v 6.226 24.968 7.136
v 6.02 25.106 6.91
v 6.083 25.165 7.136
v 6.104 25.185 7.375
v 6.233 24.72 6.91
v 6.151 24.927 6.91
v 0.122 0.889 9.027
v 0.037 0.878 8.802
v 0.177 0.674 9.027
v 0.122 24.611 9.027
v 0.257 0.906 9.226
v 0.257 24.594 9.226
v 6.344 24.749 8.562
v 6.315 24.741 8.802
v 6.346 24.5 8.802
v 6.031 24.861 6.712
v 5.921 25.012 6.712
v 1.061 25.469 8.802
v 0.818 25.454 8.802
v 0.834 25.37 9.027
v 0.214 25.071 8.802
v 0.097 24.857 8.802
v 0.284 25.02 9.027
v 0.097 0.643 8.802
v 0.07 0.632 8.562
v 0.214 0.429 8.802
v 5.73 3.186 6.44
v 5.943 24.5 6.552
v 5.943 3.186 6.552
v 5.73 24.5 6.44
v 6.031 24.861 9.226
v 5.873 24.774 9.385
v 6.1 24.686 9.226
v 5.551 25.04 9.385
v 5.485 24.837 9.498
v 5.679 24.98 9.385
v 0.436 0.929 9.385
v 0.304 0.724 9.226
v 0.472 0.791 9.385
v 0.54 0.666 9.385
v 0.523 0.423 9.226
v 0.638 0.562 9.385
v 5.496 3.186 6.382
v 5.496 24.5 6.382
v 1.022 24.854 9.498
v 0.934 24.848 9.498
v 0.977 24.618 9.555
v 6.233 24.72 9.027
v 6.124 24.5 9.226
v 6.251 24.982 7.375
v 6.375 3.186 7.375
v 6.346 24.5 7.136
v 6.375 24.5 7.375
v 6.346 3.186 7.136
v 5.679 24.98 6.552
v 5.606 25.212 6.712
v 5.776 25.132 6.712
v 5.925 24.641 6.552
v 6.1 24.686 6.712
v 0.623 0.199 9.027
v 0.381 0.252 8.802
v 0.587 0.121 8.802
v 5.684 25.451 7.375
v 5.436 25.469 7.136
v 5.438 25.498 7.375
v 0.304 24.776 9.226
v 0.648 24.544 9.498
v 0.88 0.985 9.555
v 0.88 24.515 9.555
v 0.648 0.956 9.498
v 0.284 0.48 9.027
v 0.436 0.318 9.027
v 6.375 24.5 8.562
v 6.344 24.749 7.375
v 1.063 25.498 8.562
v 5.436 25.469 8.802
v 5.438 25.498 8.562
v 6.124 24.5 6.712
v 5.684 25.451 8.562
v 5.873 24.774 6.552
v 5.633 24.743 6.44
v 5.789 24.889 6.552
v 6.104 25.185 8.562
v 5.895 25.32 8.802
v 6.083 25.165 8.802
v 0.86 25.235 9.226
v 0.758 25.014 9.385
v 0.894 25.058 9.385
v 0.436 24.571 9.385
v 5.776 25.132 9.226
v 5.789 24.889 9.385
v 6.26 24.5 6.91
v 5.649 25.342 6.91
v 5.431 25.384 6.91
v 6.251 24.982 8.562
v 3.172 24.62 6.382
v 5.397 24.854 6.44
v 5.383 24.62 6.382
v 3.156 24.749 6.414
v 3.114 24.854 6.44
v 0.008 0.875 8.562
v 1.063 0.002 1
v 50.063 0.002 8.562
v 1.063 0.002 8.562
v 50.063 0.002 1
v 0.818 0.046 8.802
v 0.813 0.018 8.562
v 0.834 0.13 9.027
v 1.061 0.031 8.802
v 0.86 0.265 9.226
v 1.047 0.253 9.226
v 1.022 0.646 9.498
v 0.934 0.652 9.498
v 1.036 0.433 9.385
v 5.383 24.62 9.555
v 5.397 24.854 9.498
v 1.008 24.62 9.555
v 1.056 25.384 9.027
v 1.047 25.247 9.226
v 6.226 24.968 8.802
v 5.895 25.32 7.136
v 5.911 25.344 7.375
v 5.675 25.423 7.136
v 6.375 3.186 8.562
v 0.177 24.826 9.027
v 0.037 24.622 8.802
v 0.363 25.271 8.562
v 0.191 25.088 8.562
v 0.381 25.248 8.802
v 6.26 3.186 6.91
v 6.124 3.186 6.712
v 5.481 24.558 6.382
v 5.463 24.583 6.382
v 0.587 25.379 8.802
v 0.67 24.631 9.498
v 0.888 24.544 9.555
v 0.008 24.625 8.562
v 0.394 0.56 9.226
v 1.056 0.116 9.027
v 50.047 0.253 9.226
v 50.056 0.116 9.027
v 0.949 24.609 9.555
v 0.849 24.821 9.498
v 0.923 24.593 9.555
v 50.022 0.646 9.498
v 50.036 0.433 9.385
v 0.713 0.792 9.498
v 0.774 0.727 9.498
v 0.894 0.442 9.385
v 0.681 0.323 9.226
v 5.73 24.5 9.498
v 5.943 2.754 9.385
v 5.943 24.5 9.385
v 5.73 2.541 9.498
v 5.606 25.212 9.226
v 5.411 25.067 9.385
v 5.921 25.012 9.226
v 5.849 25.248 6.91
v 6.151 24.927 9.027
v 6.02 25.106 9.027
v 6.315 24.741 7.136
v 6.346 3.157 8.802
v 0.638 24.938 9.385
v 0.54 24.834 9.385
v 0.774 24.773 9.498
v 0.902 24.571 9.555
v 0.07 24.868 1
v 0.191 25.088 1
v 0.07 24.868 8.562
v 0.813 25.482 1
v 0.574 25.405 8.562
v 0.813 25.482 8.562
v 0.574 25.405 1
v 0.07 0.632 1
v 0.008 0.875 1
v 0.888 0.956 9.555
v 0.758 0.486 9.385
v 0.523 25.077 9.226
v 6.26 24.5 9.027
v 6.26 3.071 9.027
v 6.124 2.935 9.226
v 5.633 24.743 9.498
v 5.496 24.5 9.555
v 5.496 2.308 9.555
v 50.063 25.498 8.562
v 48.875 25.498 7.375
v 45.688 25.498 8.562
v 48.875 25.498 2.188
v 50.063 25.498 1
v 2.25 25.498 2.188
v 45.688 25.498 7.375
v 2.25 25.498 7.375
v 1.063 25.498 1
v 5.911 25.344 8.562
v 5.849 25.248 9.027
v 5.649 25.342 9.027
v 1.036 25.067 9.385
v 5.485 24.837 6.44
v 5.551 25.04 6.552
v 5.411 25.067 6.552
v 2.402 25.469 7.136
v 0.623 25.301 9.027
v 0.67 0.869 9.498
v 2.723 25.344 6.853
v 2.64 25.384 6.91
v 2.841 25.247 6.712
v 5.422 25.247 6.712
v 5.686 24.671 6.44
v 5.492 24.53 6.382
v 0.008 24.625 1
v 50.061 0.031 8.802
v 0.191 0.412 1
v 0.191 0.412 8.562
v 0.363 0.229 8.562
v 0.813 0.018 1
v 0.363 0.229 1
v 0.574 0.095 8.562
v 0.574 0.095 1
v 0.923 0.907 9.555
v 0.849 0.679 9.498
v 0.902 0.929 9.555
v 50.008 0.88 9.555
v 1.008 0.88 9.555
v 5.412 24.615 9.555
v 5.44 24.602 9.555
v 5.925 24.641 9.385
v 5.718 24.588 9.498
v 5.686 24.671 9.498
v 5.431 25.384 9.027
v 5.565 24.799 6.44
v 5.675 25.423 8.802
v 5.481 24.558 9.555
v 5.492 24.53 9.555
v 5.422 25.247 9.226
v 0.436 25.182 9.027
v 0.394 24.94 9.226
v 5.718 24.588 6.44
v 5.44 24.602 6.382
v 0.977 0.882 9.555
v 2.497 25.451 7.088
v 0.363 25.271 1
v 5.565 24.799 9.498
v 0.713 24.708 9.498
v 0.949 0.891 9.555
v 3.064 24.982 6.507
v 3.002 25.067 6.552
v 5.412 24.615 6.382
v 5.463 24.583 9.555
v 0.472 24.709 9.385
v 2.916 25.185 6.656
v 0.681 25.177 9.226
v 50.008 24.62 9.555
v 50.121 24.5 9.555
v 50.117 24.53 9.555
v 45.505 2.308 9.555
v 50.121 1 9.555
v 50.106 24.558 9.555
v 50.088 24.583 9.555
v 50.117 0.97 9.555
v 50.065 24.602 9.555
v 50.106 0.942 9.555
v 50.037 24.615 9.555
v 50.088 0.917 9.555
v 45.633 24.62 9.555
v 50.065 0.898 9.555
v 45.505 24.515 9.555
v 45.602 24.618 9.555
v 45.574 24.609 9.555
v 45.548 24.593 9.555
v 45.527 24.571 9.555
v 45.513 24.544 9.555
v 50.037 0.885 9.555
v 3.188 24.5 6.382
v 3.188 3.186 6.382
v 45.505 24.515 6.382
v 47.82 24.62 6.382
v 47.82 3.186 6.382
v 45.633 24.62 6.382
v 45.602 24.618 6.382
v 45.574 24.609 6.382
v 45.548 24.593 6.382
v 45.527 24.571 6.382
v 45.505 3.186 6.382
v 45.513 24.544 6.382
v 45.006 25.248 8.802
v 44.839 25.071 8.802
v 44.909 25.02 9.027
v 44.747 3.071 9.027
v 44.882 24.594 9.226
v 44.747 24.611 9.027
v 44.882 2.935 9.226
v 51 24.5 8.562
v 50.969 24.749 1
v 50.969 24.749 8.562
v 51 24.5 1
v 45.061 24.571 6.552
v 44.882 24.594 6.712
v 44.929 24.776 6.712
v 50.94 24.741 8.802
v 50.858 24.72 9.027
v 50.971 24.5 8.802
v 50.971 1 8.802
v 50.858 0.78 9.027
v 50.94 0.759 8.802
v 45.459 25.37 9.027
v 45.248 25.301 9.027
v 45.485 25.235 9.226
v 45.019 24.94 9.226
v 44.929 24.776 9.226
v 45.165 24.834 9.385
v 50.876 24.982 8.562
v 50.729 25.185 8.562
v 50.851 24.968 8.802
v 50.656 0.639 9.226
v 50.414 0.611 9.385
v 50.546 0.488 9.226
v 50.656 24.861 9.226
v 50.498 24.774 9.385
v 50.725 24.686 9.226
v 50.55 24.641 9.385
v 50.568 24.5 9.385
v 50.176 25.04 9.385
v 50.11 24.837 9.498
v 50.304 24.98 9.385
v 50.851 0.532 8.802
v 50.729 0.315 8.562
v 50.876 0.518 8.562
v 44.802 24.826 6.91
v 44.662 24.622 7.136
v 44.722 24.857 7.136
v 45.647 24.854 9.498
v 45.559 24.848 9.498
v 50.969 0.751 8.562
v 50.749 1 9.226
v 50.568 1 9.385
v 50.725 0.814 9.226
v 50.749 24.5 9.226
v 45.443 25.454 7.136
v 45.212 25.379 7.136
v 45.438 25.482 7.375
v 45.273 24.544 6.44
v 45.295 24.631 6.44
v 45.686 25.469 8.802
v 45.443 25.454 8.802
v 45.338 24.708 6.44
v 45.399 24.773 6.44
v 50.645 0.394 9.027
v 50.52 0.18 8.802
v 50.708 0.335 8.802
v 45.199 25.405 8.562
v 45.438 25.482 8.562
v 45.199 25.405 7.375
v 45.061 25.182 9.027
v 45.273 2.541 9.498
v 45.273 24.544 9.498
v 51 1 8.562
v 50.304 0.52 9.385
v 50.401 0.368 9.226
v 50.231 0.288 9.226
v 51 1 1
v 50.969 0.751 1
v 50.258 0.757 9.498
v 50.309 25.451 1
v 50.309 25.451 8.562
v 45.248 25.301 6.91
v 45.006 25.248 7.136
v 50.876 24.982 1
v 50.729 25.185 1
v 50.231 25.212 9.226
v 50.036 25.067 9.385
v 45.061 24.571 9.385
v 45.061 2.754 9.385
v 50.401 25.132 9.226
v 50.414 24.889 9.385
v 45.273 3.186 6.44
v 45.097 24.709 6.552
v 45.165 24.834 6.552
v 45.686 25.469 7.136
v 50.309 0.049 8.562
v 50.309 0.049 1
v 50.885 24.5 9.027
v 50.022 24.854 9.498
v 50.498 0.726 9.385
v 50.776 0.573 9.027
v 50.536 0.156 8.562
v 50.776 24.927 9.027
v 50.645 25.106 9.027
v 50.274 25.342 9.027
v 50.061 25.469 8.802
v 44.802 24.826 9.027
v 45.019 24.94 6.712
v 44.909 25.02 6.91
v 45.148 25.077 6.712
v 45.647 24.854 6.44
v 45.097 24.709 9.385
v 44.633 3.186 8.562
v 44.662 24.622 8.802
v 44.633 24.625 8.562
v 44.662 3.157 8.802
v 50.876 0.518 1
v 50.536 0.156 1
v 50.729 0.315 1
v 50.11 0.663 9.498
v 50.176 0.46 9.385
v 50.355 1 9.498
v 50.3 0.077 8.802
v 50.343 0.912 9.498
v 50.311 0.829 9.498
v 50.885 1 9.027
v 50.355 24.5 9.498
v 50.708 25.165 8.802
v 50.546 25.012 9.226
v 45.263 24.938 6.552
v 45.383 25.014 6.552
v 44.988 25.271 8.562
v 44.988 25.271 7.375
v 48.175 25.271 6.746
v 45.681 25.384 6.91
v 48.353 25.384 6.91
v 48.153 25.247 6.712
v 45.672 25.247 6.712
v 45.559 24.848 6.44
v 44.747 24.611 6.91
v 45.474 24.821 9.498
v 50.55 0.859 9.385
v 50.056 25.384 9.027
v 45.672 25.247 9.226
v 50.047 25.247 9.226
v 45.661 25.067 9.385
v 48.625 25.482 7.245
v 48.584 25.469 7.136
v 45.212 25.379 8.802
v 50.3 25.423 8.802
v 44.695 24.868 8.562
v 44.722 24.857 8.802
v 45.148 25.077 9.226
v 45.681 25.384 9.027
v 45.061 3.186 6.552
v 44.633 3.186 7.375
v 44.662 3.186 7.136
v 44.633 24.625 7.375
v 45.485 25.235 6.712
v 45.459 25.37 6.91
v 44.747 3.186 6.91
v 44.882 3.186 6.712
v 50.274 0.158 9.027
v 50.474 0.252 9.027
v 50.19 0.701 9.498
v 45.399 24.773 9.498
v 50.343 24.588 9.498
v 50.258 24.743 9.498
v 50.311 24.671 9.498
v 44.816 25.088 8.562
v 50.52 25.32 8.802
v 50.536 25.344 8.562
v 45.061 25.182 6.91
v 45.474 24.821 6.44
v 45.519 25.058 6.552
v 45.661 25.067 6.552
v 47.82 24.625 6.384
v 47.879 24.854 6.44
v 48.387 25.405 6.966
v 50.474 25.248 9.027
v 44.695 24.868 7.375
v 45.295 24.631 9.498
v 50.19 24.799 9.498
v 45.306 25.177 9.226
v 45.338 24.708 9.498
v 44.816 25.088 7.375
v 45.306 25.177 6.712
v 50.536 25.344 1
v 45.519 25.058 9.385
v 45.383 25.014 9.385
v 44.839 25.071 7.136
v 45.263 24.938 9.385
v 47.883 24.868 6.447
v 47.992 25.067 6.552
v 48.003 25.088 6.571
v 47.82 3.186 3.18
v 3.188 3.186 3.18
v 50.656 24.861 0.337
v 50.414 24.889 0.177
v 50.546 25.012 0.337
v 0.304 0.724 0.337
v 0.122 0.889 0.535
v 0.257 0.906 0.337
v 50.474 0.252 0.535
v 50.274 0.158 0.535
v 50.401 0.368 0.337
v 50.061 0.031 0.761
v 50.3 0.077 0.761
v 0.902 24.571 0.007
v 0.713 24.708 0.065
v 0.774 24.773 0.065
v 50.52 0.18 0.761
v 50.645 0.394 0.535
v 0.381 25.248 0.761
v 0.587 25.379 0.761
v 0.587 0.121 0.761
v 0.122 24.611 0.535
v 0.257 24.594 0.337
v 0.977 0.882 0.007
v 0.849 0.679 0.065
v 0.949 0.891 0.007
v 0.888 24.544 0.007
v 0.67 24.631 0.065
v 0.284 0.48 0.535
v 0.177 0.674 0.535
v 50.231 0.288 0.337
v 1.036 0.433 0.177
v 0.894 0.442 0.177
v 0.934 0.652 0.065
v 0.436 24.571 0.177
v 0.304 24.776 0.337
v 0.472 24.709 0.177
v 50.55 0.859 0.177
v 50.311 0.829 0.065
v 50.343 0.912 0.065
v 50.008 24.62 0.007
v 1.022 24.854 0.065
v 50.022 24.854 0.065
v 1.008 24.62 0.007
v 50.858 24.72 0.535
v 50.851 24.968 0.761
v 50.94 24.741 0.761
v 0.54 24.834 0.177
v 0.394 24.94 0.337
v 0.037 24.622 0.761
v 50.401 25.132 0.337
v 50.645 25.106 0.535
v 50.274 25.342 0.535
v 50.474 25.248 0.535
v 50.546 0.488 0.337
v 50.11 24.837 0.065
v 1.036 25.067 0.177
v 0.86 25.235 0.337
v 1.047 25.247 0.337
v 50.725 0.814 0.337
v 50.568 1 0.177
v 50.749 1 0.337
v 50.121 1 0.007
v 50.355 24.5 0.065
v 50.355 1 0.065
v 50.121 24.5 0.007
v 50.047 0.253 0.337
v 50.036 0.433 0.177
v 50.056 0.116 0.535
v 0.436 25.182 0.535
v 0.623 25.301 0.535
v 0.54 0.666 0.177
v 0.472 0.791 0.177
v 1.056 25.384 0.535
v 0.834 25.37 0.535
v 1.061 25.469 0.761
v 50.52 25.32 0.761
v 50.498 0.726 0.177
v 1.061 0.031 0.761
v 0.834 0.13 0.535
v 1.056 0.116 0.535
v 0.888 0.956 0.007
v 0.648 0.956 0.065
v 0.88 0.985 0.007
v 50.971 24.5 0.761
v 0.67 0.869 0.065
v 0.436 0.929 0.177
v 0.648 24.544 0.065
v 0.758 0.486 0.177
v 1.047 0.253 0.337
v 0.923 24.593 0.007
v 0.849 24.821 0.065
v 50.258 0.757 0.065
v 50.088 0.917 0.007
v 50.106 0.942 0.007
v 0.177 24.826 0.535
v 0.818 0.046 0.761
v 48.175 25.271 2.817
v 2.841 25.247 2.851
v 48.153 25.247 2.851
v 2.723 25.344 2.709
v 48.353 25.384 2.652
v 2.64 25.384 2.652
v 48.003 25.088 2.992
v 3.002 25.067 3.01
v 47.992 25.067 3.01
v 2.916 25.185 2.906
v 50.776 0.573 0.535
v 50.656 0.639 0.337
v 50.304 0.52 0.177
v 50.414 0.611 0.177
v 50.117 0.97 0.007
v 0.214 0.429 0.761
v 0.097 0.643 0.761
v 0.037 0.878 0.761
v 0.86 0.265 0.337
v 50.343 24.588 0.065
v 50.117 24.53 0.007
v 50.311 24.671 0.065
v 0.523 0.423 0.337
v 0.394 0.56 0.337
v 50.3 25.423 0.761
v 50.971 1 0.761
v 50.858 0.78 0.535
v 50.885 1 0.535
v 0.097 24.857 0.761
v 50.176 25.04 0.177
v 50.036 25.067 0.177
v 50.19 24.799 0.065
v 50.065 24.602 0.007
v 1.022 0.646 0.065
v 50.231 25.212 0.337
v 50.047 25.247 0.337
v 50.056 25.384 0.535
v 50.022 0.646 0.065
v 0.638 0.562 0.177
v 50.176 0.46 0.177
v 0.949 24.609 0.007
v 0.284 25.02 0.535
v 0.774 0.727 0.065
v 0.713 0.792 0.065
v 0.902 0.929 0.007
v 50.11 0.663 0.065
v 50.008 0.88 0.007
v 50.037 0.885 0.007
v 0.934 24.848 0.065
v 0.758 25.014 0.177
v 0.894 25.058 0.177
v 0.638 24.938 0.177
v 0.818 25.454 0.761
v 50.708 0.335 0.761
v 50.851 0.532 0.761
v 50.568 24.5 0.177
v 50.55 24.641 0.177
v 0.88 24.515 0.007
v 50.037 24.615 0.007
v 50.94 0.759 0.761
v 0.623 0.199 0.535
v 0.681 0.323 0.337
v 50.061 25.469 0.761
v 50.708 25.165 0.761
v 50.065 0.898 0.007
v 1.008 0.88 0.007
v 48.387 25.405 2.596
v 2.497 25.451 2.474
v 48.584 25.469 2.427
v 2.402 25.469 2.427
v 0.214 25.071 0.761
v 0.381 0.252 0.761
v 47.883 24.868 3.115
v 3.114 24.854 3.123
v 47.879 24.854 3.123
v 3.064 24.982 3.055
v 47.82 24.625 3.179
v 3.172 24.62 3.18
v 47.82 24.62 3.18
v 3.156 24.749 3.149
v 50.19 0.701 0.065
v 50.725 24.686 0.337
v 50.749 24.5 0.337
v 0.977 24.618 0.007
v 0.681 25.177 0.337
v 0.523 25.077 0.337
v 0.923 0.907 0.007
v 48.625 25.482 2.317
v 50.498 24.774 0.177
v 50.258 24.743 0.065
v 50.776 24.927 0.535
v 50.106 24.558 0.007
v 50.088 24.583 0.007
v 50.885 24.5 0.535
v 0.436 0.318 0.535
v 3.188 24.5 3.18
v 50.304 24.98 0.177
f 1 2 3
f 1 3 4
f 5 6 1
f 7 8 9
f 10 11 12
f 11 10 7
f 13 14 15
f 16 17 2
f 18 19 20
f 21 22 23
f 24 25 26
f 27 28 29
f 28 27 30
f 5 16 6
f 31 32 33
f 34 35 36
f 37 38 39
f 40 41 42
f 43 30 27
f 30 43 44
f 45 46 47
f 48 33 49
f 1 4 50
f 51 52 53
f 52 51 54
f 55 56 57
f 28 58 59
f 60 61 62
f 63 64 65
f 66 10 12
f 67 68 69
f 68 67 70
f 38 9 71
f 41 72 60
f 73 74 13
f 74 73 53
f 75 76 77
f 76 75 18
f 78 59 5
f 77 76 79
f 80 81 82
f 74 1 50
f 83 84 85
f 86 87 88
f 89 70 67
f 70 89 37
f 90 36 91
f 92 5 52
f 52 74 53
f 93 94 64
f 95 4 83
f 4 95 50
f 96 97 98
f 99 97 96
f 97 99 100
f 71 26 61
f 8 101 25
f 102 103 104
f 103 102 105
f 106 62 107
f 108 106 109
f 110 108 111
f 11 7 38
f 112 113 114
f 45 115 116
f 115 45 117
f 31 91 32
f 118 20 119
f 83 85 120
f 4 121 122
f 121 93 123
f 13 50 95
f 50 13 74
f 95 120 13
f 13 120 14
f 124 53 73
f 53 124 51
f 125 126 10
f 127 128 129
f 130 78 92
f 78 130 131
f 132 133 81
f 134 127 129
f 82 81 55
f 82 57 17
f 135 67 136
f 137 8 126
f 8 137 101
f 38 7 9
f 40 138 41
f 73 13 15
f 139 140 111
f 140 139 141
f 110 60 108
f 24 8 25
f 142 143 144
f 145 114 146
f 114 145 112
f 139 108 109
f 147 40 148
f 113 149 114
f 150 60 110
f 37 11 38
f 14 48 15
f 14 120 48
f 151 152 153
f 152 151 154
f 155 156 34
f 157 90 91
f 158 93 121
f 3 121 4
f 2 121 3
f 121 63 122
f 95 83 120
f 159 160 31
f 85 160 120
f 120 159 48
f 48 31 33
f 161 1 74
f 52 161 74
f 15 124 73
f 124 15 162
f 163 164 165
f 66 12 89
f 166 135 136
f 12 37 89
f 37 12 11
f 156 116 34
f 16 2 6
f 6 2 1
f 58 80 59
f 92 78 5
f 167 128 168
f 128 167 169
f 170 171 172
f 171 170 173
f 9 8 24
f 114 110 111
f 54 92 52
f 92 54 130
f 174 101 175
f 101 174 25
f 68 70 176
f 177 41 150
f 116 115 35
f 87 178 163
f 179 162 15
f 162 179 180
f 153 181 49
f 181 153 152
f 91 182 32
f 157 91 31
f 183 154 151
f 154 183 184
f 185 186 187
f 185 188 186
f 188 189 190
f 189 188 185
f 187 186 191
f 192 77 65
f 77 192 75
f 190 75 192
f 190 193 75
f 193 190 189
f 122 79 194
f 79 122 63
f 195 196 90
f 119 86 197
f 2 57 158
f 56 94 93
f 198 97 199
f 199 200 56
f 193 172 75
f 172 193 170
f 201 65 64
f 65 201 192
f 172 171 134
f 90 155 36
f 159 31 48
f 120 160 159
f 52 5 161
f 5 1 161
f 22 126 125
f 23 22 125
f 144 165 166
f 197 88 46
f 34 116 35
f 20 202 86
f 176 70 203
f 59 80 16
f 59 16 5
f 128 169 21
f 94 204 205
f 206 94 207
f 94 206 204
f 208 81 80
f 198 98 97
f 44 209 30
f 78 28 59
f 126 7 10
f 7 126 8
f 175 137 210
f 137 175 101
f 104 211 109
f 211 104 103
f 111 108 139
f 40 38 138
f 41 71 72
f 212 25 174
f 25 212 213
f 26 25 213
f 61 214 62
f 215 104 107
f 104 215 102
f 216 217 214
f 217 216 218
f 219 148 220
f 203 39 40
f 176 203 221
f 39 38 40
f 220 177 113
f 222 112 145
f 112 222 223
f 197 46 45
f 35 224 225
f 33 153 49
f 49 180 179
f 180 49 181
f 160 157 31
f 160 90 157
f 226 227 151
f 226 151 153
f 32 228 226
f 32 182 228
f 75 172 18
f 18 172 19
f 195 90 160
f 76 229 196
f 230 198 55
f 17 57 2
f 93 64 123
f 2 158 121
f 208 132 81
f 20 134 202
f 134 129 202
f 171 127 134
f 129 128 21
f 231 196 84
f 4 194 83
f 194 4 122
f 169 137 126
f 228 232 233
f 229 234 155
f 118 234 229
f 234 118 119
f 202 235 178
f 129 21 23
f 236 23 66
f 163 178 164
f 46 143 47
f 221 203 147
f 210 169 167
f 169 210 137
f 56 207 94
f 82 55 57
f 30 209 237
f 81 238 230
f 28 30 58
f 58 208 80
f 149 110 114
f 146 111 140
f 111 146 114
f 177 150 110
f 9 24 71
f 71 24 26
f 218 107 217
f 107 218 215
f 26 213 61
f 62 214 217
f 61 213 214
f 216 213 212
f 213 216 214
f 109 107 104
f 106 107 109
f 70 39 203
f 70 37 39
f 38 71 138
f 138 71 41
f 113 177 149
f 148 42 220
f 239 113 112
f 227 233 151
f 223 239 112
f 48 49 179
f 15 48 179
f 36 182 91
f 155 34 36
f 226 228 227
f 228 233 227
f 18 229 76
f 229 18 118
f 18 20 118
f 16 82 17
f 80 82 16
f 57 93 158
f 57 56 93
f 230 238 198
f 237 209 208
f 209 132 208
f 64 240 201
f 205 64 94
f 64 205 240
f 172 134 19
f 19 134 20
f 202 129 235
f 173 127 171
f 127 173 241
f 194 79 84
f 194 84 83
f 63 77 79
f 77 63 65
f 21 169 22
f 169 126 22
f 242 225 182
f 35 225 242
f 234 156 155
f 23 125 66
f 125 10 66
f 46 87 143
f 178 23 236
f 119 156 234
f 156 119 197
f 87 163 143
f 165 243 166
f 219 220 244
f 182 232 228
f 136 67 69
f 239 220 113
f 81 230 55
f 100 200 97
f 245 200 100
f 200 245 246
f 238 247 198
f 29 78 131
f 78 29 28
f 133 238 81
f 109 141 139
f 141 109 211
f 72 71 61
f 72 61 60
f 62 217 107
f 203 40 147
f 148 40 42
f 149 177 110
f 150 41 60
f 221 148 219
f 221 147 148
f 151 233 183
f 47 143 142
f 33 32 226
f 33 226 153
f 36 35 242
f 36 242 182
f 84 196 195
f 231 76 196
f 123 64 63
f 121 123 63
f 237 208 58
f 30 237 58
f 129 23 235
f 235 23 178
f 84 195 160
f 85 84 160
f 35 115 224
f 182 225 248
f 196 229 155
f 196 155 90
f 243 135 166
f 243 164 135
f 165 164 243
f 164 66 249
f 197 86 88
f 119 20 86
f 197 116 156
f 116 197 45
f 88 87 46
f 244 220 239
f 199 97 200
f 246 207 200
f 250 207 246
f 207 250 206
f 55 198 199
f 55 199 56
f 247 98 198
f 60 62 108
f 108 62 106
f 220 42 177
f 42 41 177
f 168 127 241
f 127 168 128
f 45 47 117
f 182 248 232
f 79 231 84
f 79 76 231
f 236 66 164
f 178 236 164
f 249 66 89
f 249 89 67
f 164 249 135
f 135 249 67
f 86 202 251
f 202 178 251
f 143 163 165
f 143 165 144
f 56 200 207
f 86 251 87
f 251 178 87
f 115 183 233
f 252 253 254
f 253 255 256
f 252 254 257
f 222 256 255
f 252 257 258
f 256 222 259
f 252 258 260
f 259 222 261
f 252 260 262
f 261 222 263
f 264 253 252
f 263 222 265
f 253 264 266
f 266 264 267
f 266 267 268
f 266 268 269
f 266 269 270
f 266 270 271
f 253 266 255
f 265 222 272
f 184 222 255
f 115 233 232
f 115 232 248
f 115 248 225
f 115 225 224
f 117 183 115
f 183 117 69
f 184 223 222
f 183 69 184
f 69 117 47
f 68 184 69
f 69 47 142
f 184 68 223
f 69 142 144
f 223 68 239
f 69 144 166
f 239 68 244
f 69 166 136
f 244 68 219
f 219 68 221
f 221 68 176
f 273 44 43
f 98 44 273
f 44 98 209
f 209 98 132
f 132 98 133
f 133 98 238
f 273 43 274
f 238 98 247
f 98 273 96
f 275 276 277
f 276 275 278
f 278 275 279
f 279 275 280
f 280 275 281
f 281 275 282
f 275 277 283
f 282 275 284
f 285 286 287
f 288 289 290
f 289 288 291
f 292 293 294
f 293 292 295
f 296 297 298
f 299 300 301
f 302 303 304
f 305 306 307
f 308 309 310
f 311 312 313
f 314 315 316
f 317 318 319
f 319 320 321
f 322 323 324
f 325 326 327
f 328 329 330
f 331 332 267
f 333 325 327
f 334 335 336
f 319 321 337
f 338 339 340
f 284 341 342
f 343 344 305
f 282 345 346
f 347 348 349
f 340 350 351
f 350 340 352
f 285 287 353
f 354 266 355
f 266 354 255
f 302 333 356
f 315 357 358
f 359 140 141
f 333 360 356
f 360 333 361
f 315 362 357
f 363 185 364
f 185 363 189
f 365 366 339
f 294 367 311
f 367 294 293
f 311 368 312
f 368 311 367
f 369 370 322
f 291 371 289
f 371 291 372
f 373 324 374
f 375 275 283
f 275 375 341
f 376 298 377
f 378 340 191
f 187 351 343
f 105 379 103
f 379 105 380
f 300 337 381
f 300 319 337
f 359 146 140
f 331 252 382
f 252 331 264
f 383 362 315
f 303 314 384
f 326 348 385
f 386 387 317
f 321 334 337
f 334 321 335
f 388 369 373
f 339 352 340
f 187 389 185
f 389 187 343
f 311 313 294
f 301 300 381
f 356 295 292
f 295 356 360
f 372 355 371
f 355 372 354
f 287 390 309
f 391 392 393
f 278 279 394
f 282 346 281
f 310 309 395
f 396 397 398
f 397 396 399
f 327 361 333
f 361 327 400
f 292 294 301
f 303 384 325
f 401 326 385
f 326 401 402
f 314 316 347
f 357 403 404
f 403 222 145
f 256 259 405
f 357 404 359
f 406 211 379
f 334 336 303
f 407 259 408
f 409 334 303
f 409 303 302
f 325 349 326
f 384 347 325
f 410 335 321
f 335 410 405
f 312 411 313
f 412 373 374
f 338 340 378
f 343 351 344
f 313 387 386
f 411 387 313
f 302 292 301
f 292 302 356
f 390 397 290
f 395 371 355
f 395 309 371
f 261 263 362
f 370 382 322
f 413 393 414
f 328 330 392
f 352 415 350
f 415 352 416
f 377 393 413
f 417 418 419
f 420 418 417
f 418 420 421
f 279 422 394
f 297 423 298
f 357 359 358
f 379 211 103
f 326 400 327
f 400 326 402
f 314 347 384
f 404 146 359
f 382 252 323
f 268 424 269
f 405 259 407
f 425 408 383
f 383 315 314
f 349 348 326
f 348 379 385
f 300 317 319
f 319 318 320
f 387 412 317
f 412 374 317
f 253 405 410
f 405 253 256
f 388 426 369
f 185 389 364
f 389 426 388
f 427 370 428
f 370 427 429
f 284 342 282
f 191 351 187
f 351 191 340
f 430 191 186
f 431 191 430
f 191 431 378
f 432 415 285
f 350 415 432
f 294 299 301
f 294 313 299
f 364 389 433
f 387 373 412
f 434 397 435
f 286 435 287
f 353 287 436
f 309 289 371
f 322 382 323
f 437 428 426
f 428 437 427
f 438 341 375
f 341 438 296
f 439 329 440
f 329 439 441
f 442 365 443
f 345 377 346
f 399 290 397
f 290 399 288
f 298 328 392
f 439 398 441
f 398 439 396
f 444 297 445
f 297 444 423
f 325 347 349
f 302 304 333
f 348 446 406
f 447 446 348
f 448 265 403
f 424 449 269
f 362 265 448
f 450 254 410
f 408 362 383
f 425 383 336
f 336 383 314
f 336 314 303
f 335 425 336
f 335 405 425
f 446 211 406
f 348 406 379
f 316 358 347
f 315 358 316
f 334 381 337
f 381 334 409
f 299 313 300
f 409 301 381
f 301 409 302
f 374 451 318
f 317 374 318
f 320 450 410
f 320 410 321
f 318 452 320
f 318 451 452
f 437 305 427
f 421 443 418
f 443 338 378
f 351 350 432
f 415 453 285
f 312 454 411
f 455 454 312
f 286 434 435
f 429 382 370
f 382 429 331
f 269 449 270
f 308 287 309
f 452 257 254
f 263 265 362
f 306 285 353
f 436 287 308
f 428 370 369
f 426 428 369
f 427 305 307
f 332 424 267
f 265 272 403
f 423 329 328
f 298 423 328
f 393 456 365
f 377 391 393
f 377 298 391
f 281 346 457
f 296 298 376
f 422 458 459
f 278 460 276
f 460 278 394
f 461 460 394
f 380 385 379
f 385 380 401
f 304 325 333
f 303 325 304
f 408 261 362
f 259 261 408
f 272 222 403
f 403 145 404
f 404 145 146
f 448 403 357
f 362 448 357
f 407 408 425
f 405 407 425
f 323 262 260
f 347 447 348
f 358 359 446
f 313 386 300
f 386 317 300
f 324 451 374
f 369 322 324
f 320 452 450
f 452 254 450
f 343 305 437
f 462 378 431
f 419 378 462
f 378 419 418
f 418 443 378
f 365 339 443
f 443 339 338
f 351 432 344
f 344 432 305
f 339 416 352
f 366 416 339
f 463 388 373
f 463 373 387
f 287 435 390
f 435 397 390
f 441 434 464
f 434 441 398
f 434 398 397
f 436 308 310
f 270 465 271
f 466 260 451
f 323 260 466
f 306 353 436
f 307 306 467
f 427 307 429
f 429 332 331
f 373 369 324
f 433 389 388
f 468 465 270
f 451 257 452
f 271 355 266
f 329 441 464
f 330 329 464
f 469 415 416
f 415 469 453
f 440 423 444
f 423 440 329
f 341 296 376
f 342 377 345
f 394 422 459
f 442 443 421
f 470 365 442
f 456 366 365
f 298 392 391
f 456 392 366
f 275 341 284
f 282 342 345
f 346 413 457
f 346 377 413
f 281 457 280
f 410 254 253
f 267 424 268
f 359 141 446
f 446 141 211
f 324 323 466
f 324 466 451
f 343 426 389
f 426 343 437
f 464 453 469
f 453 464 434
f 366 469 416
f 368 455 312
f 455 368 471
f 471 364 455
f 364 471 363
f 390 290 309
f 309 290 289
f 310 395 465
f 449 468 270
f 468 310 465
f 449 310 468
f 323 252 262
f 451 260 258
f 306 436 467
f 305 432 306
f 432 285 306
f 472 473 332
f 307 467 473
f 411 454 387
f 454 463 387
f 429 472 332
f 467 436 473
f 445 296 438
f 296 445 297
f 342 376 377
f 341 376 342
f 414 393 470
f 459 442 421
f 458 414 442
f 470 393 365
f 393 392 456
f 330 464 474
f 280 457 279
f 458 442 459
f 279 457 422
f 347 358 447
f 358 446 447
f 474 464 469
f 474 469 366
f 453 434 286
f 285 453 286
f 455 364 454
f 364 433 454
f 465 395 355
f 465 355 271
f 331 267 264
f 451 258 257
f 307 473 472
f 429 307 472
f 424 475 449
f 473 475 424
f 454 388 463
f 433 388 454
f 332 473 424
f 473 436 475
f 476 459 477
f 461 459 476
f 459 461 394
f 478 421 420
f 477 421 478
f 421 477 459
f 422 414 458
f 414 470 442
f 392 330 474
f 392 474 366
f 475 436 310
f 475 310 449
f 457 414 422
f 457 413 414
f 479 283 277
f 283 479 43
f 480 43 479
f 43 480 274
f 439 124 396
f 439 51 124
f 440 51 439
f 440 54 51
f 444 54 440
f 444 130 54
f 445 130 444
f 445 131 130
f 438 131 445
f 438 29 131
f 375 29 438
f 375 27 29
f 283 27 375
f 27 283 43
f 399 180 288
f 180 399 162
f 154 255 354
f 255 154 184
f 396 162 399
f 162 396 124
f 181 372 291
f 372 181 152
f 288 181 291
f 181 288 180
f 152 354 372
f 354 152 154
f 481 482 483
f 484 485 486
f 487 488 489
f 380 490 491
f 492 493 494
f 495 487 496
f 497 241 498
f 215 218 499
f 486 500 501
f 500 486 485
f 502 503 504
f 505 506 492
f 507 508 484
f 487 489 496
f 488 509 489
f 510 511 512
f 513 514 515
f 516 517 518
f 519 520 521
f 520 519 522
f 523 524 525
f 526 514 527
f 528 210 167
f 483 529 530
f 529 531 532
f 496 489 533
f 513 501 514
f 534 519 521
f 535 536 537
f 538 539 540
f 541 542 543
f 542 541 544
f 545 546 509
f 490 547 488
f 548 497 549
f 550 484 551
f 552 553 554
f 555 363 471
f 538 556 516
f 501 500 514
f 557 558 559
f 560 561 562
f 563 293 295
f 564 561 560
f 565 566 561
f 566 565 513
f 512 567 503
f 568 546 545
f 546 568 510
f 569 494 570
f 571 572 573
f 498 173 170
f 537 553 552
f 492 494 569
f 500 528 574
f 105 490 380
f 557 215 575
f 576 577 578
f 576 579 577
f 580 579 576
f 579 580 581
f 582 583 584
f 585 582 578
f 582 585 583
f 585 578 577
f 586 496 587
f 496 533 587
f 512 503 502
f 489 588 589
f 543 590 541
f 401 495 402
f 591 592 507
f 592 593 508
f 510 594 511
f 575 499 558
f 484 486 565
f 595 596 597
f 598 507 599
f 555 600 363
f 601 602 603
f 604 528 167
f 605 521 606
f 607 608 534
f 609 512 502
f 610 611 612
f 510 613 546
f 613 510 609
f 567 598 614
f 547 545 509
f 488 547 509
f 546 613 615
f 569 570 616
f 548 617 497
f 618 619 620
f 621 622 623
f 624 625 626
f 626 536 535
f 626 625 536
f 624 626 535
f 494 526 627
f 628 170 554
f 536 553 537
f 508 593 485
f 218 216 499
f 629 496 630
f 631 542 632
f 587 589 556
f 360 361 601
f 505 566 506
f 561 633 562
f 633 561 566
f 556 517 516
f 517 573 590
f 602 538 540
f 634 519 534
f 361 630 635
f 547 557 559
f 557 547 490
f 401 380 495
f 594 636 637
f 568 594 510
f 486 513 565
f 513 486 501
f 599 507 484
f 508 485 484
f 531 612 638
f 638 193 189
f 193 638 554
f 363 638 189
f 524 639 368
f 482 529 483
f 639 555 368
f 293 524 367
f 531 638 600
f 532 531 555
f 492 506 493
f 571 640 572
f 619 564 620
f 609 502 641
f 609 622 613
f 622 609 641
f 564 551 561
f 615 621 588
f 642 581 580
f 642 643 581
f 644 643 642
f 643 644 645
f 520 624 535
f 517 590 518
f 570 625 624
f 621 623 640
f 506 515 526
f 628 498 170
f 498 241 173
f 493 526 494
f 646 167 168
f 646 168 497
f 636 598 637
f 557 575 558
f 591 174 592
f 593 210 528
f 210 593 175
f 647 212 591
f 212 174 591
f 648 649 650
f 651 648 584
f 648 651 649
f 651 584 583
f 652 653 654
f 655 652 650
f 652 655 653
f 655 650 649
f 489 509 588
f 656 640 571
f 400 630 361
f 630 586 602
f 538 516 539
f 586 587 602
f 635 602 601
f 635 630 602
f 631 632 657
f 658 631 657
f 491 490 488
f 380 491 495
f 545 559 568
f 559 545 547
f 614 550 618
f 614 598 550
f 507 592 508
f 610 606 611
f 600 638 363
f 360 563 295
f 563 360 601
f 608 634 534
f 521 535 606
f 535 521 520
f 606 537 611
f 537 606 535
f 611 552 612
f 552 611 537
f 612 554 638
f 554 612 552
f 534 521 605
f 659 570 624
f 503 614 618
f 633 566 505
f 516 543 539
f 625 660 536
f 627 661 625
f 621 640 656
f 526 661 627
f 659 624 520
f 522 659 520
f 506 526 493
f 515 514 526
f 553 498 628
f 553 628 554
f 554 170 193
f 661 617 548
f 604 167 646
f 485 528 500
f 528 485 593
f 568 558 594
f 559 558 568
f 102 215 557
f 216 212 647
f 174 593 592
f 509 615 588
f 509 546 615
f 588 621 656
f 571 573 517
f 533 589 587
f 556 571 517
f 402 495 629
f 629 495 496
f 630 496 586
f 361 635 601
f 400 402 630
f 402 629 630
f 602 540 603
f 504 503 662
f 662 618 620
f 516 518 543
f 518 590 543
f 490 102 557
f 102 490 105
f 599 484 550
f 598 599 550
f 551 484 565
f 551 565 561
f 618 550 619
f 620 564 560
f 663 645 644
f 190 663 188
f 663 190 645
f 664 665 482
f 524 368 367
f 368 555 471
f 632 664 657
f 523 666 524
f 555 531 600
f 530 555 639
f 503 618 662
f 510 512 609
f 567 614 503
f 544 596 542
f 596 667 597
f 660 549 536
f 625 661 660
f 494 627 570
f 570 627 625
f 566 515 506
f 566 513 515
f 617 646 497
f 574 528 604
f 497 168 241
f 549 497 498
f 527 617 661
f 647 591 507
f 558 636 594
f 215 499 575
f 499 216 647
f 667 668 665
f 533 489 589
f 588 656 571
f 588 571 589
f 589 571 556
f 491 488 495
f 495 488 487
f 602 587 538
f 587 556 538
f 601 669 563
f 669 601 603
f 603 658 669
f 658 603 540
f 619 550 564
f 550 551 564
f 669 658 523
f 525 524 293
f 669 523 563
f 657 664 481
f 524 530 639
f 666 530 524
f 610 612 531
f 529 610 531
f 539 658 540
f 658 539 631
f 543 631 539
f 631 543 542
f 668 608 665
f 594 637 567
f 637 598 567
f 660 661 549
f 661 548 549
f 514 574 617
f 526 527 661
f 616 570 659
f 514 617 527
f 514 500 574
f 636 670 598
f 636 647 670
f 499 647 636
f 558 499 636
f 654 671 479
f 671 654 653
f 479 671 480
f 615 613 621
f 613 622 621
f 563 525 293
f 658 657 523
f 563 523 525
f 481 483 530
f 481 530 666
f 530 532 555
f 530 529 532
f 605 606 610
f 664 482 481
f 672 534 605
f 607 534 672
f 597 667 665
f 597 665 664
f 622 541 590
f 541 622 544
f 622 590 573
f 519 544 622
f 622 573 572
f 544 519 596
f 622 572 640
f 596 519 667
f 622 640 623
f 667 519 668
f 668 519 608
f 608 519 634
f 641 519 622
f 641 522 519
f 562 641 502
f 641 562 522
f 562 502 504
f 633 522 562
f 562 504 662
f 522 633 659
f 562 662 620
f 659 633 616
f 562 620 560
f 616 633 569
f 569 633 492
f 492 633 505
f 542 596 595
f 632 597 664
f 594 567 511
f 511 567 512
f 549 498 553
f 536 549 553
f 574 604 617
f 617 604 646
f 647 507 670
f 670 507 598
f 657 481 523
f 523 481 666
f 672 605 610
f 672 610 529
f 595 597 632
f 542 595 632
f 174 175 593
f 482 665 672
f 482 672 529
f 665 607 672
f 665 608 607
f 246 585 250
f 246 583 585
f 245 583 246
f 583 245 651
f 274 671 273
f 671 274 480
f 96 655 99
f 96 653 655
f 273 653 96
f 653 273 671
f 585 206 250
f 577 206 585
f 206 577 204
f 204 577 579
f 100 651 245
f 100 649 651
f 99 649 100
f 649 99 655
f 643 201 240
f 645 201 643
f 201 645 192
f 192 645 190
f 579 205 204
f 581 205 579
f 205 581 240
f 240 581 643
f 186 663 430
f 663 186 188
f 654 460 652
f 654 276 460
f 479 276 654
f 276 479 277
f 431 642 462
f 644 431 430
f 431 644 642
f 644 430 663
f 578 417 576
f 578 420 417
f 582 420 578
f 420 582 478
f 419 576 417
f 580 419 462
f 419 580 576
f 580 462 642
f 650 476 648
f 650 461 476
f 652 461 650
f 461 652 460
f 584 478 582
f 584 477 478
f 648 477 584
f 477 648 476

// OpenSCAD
// file: lib/cover.scad
//fine = true; 
fine = false; 

$fn = fine ? 100 : 25;

roundcorner = 2; 

horn_arc = 45;

horn_diameter = 5;

base_size = 25.5;
plate_thickness = base_size / 8;




module bar(roundcorner = 1, x = base_size, y = base_size, z = plate_thickness, color = "purple") {
    translate([roundcorner, roundcorner, roundcorner]) {
        color(color) {
            minkowski() {
                cube([x - (roundcorner * 2), y - (roundcorner * 2), z - (roundcorner * 2)]);
                sphere(d = roundcorner * 2);
            }
        }
    }
}



    
module cover(x_ness = 1, y_ness = 1) {

    // base plate
    bar(x = base_size * x_ness, y = base_size * y_ness, z = plate_thickness);

    // sides
    bar(color = "green", x = plate_thickness, y = base_size * y_ness, z = plate_thickness * 3);
    translate([(base_size * x_ness) - plate_thickness, 0, 0]) 
        bar(color = "red", x = plate_thickness, y = base_size * y_ness, z = plate_thickness * 3);
    bar(color = "blue", x = base_size * x_ness, y = plate_thickness, z = plate_thickness * 3);
    
    // cover
    translate([0, 0, plate_thickness * 2]) {
        bar(color = "grey", x = plate_thickness * 2, y = base_size * y_ness);
        translate([(base_size * x_ness) - (plate_thickness * 2), 0, 0]) 
            bar(color = "black", x = plate_thickness * 2, y = base_size * y_ness);
        bar(color = "white", x = base_size * x_ness, y = plate_thickness * y_ness);

    }

}
// main file
fine = true;
//fine = false;

$fn = fine ? 100 : 25;



base_size = 25.5;
plate_thickness = base_size / 8;



use <lib/cover.scad>;

cover(2, 1, 0.2);
